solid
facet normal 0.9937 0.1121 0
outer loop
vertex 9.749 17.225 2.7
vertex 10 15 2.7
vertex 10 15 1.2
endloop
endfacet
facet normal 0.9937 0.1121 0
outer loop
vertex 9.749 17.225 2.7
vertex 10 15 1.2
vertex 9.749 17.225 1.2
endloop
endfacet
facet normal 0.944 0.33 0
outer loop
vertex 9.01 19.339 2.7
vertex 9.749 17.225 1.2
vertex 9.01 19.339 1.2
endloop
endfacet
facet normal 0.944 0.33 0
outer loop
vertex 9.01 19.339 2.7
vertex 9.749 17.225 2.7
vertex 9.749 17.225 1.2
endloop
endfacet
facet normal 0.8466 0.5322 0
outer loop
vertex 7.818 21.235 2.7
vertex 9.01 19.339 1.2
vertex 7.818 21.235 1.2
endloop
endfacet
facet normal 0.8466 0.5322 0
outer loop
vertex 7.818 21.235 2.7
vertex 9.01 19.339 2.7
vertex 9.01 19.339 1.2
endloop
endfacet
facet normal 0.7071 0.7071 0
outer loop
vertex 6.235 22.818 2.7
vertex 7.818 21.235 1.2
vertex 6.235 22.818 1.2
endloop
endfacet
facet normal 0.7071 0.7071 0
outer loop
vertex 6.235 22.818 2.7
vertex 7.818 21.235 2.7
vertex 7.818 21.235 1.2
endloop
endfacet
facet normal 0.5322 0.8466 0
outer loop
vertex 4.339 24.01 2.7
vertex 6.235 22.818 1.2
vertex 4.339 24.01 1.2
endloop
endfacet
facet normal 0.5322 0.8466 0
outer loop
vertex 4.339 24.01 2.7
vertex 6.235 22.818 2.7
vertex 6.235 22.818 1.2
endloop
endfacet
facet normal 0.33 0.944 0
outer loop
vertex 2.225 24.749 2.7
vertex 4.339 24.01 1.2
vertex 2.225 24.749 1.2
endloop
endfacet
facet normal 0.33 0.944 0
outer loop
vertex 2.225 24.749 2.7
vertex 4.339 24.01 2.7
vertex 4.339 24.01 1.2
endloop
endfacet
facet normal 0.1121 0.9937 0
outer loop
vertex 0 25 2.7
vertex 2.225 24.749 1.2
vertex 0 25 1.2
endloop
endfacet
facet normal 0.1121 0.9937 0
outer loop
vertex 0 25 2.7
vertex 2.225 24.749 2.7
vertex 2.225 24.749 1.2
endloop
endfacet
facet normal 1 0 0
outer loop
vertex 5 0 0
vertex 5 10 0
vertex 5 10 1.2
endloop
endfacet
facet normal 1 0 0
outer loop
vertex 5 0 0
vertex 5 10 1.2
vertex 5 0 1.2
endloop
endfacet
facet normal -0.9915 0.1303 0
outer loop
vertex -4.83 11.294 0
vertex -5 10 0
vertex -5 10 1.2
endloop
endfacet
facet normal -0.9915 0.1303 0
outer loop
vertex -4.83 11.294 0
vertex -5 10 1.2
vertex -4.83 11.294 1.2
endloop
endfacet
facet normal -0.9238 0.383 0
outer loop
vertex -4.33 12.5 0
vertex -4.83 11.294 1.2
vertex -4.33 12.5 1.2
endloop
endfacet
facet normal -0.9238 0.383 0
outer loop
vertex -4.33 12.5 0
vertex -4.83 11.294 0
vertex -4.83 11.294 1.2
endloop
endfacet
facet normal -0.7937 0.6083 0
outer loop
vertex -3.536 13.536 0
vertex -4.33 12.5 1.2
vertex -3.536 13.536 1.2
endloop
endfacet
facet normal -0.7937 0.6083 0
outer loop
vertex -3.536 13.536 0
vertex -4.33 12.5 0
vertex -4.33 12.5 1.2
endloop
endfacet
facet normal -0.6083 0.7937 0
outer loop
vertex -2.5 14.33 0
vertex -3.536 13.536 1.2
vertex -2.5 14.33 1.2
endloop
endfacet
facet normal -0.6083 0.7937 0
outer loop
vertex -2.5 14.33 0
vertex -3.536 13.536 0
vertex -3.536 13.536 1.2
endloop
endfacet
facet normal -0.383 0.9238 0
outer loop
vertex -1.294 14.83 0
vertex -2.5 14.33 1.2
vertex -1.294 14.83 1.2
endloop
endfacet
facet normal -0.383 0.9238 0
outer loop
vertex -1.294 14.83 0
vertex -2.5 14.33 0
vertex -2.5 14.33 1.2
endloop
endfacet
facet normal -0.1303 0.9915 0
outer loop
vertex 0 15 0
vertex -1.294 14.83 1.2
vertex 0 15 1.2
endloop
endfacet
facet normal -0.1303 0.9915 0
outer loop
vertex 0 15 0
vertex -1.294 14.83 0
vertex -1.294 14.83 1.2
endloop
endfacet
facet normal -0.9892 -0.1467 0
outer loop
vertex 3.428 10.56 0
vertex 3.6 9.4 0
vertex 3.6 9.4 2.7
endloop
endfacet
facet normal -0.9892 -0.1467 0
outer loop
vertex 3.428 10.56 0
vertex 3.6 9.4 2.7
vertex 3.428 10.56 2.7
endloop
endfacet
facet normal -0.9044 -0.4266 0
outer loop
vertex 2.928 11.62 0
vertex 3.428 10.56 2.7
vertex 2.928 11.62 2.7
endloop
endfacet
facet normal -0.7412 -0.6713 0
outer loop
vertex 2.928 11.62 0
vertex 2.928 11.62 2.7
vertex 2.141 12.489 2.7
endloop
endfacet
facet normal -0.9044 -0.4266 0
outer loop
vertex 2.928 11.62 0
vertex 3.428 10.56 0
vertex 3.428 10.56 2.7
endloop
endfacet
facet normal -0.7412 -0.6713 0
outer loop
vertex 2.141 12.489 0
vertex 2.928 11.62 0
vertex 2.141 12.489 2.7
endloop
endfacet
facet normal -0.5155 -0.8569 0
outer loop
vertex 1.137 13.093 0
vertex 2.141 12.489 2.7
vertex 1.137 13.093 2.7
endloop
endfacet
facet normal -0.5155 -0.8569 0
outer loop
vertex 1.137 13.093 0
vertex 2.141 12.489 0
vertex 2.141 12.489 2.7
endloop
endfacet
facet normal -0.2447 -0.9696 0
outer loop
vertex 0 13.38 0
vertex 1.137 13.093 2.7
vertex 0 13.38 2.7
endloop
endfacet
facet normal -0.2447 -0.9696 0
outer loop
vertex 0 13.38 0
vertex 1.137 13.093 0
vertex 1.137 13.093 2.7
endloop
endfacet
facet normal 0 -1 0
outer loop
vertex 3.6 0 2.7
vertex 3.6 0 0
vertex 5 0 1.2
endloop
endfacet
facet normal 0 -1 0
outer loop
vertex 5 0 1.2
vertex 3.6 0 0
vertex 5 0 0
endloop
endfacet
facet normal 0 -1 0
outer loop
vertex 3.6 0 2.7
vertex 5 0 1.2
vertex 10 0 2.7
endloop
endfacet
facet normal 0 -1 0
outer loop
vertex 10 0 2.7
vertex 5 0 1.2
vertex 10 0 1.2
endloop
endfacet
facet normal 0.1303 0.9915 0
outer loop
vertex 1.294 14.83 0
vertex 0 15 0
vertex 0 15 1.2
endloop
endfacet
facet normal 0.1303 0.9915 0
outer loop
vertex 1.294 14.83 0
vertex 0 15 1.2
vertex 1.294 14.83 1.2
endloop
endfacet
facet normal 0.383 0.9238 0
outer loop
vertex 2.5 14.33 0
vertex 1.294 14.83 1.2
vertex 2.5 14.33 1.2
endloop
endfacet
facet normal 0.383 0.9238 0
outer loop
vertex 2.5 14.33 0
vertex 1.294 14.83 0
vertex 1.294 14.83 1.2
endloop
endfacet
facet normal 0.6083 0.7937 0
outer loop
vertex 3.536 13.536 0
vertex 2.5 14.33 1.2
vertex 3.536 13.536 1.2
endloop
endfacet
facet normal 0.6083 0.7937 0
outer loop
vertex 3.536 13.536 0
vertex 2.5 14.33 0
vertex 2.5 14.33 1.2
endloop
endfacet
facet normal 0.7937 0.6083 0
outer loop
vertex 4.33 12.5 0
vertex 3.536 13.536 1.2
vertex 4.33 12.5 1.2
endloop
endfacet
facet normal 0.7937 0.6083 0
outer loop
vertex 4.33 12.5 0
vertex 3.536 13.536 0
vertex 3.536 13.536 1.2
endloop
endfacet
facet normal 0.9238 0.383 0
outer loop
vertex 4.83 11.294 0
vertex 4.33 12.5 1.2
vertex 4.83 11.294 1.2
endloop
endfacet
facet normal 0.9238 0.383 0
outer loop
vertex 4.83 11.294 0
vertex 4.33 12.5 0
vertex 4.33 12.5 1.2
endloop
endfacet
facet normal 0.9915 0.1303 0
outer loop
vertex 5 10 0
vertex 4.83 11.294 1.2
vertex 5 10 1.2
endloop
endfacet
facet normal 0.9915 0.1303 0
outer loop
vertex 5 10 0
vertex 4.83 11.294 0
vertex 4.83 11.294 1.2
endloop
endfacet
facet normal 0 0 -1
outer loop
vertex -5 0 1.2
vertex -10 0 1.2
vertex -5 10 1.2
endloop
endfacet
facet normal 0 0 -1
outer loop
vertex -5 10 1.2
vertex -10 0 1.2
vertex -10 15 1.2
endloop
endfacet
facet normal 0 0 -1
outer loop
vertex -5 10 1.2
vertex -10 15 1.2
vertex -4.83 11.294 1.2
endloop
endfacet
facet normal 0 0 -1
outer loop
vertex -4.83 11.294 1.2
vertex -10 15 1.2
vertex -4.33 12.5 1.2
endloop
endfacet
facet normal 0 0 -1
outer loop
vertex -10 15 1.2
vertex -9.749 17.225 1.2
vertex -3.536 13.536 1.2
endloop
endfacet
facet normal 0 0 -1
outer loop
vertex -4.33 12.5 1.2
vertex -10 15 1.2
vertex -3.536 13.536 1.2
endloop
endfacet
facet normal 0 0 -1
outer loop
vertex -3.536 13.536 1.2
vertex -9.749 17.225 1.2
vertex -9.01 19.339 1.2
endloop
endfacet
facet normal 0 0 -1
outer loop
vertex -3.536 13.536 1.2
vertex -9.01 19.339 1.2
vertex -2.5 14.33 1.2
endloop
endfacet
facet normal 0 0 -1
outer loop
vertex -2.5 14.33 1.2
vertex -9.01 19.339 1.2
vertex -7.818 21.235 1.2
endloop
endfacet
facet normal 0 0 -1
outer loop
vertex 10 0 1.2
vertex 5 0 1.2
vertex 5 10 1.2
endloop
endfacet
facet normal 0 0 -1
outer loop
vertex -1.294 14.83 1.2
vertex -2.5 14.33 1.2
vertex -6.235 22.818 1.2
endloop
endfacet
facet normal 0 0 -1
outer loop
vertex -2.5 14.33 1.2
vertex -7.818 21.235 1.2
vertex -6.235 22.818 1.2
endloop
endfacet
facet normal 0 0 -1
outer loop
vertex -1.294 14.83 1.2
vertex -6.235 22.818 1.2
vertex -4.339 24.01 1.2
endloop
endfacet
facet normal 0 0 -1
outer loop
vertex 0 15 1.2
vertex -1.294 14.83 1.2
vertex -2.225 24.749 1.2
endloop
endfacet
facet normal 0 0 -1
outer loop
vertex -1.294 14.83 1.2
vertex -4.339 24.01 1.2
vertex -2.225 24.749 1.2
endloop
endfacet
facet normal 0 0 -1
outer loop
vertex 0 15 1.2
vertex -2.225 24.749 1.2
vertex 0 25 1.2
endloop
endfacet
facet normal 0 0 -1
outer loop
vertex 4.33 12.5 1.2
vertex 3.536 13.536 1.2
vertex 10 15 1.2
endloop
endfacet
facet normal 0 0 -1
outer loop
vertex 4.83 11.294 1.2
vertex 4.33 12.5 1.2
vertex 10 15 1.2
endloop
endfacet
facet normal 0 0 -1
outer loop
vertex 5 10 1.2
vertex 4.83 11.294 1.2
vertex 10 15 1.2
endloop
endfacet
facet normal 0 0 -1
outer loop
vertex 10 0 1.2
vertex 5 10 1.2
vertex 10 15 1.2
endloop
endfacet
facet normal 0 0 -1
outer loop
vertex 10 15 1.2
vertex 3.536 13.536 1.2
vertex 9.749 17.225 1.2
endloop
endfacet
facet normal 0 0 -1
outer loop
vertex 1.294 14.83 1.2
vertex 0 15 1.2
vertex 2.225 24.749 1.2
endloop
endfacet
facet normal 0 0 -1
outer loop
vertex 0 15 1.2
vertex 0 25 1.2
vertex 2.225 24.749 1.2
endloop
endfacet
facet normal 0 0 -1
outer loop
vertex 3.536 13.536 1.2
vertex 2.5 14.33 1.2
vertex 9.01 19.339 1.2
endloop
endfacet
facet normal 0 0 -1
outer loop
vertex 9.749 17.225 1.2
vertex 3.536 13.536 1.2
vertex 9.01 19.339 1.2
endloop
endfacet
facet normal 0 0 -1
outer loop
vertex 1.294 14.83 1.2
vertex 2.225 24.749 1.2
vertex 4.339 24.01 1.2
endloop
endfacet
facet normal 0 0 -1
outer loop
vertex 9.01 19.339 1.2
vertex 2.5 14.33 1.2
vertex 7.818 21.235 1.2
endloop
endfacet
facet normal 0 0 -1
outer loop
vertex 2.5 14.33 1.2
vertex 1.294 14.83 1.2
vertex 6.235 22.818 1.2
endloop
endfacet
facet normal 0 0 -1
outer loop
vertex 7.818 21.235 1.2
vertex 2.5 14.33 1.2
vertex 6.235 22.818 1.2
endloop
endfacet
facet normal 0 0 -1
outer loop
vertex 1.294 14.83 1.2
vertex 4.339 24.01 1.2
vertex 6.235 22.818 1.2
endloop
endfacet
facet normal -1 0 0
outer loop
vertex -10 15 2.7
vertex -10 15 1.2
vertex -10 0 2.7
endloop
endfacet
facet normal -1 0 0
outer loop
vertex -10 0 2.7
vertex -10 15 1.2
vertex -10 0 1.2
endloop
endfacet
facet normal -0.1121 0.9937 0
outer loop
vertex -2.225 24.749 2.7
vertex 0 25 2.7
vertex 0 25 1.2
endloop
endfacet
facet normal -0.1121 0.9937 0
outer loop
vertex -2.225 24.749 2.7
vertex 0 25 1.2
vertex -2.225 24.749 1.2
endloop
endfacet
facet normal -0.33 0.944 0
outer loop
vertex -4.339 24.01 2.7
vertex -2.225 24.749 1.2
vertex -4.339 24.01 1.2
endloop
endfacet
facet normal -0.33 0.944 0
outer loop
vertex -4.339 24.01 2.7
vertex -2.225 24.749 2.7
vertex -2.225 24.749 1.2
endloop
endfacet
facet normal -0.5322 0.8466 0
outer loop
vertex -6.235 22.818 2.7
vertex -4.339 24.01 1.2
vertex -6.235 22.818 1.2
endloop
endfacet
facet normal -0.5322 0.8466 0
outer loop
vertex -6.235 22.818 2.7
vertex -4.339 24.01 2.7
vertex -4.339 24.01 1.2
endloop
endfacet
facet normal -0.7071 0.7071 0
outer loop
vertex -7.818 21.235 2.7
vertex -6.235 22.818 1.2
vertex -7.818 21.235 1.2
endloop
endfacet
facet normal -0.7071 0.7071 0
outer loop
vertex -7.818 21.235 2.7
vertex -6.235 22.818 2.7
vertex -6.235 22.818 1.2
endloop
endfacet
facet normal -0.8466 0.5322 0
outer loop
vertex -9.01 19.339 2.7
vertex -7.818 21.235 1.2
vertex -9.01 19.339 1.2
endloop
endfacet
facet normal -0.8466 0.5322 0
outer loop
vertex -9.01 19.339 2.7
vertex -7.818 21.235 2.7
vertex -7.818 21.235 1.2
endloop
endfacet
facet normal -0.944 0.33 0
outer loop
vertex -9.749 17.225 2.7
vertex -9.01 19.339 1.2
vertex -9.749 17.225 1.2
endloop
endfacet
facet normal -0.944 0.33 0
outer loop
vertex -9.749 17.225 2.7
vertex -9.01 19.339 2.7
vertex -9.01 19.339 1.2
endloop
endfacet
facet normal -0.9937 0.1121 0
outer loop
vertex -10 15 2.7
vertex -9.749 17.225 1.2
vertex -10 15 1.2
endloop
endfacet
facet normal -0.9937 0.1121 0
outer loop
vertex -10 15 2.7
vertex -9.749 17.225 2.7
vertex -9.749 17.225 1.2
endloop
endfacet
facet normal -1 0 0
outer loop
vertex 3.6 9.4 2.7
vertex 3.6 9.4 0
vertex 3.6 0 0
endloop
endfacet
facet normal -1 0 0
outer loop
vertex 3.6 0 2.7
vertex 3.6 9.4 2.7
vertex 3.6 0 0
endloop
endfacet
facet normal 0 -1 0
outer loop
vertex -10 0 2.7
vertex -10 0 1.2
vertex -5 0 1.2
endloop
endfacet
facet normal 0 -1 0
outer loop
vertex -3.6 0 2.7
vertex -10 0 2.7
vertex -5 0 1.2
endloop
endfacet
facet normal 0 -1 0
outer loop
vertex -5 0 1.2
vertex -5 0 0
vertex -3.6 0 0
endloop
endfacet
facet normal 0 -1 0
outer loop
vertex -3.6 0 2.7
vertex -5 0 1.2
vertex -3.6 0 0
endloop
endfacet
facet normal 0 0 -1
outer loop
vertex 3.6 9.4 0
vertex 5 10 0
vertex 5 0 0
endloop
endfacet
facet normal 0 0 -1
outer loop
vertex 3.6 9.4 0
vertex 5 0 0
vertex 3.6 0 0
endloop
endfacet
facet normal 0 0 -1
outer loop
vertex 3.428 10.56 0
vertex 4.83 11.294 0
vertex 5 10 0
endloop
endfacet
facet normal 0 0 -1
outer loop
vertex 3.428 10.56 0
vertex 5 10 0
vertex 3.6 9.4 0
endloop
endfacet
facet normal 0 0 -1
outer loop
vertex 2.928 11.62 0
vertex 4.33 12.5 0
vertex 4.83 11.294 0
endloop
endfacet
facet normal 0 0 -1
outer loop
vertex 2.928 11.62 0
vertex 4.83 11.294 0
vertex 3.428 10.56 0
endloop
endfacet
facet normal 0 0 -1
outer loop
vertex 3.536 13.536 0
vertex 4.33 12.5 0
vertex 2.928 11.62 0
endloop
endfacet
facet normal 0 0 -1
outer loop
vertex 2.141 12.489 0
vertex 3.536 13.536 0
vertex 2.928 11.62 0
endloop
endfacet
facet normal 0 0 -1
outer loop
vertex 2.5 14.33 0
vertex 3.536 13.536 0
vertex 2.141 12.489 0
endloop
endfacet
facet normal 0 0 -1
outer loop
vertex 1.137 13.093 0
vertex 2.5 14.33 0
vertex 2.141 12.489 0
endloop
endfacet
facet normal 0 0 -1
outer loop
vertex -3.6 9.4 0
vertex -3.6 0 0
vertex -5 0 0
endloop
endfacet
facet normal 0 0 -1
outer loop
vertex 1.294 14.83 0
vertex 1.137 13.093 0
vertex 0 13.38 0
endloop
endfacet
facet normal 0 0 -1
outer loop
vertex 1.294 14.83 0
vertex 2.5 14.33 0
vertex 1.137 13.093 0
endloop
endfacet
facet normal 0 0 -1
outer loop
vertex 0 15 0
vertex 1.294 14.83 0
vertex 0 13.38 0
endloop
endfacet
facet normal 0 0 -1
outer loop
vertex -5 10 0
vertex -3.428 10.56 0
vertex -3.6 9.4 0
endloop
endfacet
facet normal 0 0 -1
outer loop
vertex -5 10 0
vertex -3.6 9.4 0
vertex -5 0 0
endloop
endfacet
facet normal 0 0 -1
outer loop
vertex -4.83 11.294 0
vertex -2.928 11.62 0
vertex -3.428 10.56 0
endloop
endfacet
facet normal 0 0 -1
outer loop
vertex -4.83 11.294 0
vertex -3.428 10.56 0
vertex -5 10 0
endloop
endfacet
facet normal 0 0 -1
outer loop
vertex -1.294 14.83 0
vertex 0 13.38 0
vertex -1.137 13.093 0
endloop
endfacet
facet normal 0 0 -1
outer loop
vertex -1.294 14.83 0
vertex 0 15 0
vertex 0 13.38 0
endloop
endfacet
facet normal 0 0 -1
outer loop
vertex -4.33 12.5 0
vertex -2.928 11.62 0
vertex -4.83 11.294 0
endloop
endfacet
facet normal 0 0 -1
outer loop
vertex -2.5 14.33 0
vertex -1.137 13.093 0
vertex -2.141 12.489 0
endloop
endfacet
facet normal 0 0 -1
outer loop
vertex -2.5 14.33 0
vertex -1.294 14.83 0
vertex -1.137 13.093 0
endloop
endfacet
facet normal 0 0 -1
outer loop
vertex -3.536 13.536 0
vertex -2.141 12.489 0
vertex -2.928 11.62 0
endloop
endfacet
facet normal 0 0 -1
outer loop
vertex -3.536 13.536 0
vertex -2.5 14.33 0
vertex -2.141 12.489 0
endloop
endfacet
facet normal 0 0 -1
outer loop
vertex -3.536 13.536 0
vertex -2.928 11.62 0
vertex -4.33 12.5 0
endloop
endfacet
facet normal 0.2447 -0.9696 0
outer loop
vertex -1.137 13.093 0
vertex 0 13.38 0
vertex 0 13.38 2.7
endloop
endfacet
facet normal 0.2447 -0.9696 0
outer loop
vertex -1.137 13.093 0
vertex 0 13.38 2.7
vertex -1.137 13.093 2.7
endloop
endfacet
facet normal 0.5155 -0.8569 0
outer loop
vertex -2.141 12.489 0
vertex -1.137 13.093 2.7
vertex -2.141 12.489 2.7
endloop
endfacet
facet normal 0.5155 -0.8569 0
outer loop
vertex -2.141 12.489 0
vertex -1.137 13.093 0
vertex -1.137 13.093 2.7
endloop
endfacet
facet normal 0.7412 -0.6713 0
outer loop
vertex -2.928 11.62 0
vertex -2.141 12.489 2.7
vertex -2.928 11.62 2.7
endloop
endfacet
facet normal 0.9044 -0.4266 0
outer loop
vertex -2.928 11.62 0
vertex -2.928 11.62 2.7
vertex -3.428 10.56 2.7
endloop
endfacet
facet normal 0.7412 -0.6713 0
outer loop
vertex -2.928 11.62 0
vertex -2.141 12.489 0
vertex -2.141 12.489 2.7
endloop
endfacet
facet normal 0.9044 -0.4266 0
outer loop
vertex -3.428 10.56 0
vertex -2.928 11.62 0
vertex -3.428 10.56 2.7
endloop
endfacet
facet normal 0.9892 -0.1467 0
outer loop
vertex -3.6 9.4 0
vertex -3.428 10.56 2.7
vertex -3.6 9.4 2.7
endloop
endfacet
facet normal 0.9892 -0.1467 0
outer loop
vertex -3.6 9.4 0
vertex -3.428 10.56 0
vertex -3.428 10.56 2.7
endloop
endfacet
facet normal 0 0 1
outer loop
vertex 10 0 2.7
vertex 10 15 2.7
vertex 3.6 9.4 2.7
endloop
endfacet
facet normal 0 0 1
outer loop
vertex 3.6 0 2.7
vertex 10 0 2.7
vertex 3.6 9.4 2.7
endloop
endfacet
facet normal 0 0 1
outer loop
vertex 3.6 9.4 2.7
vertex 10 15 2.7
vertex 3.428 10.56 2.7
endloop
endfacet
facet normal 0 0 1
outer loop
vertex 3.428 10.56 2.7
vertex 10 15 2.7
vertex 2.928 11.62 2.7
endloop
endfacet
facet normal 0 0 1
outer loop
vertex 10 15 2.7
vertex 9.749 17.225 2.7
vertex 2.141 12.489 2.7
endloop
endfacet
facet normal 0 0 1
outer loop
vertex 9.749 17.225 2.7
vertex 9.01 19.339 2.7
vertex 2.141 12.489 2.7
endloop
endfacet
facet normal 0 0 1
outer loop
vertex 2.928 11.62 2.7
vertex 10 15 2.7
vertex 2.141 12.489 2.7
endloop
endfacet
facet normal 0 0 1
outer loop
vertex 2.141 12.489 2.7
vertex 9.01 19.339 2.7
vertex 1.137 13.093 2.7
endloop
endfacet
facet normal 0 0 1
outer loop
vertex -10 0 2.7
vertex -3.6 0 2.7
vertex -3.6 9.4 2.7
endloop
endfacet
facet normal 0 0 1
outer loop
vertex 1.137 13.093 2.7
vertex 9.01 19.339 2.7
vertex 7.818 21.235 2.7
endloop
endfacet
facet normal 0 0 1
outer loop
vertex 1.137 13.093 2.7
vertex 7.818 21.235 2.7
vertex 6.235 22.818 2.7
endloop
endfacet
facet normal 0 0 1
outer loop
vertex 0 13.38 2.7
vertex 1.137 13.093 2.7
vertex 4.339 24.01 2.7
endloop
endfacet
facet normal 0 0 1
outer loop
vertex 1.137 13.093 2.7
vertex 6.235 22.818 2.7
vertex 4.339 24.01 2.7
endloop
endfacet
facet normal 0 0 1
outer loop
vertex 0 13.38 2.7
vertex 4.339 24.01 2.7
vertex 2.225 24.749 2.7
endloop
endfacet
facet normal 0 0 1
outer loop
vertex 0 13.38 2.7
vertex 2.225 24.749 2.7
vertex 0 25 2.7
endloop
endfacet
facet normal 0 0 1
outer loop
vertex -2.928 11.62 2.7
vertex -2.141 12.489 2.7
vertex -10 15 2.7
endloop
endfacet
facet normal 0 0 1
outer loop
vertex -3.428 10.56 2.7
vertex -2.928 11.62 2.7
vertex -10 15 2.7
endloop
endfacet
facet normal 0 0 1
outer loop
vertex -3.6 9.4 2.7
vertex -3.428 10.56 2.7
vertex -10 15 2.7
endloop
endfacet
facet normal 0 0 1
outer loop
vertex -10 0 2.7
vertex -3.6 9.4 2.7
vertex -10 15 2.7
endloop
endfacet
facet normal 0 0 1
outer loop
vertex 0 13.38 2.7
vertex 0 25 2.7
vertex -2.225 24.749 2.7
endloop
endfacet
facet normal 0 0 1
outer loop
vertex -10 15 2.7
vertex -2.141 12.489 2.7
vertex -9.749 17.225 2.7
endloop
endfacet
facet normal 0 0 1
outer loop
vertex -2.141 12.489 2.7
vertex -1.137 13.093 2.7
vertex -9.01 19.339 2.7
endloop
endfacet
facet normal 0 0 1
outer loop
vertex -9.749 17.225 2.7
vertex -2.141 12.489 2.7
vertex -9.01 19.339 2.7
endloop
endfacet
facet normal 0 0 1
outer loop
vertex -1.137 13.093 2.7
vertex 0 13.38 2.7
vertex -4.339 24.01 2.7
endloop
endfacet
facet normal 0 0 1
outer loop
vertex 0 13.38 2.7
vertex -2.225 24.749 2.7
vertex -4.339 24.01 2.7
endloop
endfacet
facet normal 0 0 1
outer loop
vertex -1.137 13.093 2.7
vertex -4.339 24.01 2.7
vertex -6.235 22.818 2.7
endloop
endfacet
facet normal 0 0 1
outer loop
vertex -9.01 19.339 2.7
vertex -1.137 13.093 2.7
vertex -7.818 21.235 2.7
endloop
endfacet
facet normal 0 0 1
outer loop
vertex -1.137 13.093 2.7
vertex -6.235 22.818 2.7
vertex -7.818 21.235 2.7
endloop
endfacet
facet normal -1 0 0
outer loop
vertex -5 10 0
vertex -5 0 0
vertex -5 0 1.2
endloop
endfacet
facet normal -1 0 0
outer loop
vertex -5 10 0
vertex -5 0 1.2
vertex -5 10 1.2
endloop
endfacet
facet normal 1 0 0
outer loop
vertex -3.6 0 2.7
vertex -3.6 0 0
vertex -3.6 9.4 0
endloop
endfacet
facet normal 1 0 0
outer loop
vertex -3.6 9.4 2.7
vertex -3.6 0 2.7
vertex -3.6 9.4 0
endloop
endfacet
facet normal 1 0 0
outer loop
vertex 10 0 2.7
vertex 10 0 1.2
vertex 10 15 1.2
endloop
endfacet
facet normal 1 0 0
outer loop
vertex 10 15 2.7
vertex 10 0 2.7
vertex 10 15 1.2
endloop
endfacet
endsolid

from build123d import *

# Parameters (mm, degrees)
F1_DEPTH    = 2.7
F2_T1_DEPTH = 2.7
F3_R        = 9.99999
F5_DEPTH    = 1.2


# Not quite as in the source:
# - a fillet or chamfer that OpenCascade refuses, or shapes differently, is made with other operations: its cross-section is extruded or revolved along the edge and cut away or added
# - a fillet or chamfer is up to 0.001 mm smaller than in the source, because OpenCascade refuses the exact size


with BuildPart() as f1:
    # F0 (on Top) → F1 (new body)
    with BuildSketch(Plane.XY):
        Polygon((-10, 0), (-3.6, 0), (-3.6, 13.4), (0, 13.4), (3.6, 13.4), (3.6, 0), (10, 0), (10, 25), (0, 25), (-10, 25), align=None)
    extrude(amount=F1_DEPTH)

    # F2: fillet of radius 4 on 2 edges, made by hand

    # F2_s2 → F2_t1 (join)
    with BuildSketch(Plane.XY):
        with BuildLine():
            ThreePointArc((0.4, 13.4), (-2.4284271247, 12.2284271247), (-3.6, 9.4))
            Line((-3.6, 9.4), (-3.6, 13.4))
            Line((-3.6, 13.4), (0.4, 13.4))
        make_face()
        with BuildLine():
            ThreePointArc((3.6, 9.4), (2.4284271247, 12.2284271247), (-0.4, 13.4))
            Line((-0.4, 13.4), (3.6, 13.4))
            Line((3.6, 13.4), (3.6, 9.4))
        make_face()
    extrude(amount=F2_T1_DEPTH)

    # F3 (radius 10 in the source; OpenCascade refuses exactly that, so slightly less here)
    f3_edges = [f1.edges().sort_by_distance(p)[0] for p in [
        (-10, 25, 1.35),
        (10, 25, 1.35),
    ]]
    fillet(f3_edges, radius=F3_R)

    # F4 (on Top) → F5 (cut)
    with BuildSketch(Plane.XY):
        with BuildLine():
            Line((-11.2521313131, -1.0476741055), (-5, -1.0476741055))
            Line((-5, -1.0476741055), (-5, 10))
            ThreePointArc((-5, 10), (-3.5355339059, 13.5355339059), (0, 15))
            ThreePointArc((0, 15), (3.5355339059, 13.5355339059), (5, 10))
            Line((5, 10), (5, -1.0476741055))
            Line((5, -1.0476741055), (11.2521313131, -1.0476741055))
            Line((11.2521313131, -1.0476741055), (11.2521313131, 27.1253902465))
            Line((11.2521313131, 27.1253902465), (0, 27.1253902465))
            Line((0, 27.1253902465), (-11.2521313131, 27.1253902465))
            Line((-11.2521313131, 27.1253902465), (-11.2521313131, -1.0476741055))
        make_face()
    extrude(amount=F5_DEPTH, mode=Mode.SUBTRACT)


solid = f1.part
